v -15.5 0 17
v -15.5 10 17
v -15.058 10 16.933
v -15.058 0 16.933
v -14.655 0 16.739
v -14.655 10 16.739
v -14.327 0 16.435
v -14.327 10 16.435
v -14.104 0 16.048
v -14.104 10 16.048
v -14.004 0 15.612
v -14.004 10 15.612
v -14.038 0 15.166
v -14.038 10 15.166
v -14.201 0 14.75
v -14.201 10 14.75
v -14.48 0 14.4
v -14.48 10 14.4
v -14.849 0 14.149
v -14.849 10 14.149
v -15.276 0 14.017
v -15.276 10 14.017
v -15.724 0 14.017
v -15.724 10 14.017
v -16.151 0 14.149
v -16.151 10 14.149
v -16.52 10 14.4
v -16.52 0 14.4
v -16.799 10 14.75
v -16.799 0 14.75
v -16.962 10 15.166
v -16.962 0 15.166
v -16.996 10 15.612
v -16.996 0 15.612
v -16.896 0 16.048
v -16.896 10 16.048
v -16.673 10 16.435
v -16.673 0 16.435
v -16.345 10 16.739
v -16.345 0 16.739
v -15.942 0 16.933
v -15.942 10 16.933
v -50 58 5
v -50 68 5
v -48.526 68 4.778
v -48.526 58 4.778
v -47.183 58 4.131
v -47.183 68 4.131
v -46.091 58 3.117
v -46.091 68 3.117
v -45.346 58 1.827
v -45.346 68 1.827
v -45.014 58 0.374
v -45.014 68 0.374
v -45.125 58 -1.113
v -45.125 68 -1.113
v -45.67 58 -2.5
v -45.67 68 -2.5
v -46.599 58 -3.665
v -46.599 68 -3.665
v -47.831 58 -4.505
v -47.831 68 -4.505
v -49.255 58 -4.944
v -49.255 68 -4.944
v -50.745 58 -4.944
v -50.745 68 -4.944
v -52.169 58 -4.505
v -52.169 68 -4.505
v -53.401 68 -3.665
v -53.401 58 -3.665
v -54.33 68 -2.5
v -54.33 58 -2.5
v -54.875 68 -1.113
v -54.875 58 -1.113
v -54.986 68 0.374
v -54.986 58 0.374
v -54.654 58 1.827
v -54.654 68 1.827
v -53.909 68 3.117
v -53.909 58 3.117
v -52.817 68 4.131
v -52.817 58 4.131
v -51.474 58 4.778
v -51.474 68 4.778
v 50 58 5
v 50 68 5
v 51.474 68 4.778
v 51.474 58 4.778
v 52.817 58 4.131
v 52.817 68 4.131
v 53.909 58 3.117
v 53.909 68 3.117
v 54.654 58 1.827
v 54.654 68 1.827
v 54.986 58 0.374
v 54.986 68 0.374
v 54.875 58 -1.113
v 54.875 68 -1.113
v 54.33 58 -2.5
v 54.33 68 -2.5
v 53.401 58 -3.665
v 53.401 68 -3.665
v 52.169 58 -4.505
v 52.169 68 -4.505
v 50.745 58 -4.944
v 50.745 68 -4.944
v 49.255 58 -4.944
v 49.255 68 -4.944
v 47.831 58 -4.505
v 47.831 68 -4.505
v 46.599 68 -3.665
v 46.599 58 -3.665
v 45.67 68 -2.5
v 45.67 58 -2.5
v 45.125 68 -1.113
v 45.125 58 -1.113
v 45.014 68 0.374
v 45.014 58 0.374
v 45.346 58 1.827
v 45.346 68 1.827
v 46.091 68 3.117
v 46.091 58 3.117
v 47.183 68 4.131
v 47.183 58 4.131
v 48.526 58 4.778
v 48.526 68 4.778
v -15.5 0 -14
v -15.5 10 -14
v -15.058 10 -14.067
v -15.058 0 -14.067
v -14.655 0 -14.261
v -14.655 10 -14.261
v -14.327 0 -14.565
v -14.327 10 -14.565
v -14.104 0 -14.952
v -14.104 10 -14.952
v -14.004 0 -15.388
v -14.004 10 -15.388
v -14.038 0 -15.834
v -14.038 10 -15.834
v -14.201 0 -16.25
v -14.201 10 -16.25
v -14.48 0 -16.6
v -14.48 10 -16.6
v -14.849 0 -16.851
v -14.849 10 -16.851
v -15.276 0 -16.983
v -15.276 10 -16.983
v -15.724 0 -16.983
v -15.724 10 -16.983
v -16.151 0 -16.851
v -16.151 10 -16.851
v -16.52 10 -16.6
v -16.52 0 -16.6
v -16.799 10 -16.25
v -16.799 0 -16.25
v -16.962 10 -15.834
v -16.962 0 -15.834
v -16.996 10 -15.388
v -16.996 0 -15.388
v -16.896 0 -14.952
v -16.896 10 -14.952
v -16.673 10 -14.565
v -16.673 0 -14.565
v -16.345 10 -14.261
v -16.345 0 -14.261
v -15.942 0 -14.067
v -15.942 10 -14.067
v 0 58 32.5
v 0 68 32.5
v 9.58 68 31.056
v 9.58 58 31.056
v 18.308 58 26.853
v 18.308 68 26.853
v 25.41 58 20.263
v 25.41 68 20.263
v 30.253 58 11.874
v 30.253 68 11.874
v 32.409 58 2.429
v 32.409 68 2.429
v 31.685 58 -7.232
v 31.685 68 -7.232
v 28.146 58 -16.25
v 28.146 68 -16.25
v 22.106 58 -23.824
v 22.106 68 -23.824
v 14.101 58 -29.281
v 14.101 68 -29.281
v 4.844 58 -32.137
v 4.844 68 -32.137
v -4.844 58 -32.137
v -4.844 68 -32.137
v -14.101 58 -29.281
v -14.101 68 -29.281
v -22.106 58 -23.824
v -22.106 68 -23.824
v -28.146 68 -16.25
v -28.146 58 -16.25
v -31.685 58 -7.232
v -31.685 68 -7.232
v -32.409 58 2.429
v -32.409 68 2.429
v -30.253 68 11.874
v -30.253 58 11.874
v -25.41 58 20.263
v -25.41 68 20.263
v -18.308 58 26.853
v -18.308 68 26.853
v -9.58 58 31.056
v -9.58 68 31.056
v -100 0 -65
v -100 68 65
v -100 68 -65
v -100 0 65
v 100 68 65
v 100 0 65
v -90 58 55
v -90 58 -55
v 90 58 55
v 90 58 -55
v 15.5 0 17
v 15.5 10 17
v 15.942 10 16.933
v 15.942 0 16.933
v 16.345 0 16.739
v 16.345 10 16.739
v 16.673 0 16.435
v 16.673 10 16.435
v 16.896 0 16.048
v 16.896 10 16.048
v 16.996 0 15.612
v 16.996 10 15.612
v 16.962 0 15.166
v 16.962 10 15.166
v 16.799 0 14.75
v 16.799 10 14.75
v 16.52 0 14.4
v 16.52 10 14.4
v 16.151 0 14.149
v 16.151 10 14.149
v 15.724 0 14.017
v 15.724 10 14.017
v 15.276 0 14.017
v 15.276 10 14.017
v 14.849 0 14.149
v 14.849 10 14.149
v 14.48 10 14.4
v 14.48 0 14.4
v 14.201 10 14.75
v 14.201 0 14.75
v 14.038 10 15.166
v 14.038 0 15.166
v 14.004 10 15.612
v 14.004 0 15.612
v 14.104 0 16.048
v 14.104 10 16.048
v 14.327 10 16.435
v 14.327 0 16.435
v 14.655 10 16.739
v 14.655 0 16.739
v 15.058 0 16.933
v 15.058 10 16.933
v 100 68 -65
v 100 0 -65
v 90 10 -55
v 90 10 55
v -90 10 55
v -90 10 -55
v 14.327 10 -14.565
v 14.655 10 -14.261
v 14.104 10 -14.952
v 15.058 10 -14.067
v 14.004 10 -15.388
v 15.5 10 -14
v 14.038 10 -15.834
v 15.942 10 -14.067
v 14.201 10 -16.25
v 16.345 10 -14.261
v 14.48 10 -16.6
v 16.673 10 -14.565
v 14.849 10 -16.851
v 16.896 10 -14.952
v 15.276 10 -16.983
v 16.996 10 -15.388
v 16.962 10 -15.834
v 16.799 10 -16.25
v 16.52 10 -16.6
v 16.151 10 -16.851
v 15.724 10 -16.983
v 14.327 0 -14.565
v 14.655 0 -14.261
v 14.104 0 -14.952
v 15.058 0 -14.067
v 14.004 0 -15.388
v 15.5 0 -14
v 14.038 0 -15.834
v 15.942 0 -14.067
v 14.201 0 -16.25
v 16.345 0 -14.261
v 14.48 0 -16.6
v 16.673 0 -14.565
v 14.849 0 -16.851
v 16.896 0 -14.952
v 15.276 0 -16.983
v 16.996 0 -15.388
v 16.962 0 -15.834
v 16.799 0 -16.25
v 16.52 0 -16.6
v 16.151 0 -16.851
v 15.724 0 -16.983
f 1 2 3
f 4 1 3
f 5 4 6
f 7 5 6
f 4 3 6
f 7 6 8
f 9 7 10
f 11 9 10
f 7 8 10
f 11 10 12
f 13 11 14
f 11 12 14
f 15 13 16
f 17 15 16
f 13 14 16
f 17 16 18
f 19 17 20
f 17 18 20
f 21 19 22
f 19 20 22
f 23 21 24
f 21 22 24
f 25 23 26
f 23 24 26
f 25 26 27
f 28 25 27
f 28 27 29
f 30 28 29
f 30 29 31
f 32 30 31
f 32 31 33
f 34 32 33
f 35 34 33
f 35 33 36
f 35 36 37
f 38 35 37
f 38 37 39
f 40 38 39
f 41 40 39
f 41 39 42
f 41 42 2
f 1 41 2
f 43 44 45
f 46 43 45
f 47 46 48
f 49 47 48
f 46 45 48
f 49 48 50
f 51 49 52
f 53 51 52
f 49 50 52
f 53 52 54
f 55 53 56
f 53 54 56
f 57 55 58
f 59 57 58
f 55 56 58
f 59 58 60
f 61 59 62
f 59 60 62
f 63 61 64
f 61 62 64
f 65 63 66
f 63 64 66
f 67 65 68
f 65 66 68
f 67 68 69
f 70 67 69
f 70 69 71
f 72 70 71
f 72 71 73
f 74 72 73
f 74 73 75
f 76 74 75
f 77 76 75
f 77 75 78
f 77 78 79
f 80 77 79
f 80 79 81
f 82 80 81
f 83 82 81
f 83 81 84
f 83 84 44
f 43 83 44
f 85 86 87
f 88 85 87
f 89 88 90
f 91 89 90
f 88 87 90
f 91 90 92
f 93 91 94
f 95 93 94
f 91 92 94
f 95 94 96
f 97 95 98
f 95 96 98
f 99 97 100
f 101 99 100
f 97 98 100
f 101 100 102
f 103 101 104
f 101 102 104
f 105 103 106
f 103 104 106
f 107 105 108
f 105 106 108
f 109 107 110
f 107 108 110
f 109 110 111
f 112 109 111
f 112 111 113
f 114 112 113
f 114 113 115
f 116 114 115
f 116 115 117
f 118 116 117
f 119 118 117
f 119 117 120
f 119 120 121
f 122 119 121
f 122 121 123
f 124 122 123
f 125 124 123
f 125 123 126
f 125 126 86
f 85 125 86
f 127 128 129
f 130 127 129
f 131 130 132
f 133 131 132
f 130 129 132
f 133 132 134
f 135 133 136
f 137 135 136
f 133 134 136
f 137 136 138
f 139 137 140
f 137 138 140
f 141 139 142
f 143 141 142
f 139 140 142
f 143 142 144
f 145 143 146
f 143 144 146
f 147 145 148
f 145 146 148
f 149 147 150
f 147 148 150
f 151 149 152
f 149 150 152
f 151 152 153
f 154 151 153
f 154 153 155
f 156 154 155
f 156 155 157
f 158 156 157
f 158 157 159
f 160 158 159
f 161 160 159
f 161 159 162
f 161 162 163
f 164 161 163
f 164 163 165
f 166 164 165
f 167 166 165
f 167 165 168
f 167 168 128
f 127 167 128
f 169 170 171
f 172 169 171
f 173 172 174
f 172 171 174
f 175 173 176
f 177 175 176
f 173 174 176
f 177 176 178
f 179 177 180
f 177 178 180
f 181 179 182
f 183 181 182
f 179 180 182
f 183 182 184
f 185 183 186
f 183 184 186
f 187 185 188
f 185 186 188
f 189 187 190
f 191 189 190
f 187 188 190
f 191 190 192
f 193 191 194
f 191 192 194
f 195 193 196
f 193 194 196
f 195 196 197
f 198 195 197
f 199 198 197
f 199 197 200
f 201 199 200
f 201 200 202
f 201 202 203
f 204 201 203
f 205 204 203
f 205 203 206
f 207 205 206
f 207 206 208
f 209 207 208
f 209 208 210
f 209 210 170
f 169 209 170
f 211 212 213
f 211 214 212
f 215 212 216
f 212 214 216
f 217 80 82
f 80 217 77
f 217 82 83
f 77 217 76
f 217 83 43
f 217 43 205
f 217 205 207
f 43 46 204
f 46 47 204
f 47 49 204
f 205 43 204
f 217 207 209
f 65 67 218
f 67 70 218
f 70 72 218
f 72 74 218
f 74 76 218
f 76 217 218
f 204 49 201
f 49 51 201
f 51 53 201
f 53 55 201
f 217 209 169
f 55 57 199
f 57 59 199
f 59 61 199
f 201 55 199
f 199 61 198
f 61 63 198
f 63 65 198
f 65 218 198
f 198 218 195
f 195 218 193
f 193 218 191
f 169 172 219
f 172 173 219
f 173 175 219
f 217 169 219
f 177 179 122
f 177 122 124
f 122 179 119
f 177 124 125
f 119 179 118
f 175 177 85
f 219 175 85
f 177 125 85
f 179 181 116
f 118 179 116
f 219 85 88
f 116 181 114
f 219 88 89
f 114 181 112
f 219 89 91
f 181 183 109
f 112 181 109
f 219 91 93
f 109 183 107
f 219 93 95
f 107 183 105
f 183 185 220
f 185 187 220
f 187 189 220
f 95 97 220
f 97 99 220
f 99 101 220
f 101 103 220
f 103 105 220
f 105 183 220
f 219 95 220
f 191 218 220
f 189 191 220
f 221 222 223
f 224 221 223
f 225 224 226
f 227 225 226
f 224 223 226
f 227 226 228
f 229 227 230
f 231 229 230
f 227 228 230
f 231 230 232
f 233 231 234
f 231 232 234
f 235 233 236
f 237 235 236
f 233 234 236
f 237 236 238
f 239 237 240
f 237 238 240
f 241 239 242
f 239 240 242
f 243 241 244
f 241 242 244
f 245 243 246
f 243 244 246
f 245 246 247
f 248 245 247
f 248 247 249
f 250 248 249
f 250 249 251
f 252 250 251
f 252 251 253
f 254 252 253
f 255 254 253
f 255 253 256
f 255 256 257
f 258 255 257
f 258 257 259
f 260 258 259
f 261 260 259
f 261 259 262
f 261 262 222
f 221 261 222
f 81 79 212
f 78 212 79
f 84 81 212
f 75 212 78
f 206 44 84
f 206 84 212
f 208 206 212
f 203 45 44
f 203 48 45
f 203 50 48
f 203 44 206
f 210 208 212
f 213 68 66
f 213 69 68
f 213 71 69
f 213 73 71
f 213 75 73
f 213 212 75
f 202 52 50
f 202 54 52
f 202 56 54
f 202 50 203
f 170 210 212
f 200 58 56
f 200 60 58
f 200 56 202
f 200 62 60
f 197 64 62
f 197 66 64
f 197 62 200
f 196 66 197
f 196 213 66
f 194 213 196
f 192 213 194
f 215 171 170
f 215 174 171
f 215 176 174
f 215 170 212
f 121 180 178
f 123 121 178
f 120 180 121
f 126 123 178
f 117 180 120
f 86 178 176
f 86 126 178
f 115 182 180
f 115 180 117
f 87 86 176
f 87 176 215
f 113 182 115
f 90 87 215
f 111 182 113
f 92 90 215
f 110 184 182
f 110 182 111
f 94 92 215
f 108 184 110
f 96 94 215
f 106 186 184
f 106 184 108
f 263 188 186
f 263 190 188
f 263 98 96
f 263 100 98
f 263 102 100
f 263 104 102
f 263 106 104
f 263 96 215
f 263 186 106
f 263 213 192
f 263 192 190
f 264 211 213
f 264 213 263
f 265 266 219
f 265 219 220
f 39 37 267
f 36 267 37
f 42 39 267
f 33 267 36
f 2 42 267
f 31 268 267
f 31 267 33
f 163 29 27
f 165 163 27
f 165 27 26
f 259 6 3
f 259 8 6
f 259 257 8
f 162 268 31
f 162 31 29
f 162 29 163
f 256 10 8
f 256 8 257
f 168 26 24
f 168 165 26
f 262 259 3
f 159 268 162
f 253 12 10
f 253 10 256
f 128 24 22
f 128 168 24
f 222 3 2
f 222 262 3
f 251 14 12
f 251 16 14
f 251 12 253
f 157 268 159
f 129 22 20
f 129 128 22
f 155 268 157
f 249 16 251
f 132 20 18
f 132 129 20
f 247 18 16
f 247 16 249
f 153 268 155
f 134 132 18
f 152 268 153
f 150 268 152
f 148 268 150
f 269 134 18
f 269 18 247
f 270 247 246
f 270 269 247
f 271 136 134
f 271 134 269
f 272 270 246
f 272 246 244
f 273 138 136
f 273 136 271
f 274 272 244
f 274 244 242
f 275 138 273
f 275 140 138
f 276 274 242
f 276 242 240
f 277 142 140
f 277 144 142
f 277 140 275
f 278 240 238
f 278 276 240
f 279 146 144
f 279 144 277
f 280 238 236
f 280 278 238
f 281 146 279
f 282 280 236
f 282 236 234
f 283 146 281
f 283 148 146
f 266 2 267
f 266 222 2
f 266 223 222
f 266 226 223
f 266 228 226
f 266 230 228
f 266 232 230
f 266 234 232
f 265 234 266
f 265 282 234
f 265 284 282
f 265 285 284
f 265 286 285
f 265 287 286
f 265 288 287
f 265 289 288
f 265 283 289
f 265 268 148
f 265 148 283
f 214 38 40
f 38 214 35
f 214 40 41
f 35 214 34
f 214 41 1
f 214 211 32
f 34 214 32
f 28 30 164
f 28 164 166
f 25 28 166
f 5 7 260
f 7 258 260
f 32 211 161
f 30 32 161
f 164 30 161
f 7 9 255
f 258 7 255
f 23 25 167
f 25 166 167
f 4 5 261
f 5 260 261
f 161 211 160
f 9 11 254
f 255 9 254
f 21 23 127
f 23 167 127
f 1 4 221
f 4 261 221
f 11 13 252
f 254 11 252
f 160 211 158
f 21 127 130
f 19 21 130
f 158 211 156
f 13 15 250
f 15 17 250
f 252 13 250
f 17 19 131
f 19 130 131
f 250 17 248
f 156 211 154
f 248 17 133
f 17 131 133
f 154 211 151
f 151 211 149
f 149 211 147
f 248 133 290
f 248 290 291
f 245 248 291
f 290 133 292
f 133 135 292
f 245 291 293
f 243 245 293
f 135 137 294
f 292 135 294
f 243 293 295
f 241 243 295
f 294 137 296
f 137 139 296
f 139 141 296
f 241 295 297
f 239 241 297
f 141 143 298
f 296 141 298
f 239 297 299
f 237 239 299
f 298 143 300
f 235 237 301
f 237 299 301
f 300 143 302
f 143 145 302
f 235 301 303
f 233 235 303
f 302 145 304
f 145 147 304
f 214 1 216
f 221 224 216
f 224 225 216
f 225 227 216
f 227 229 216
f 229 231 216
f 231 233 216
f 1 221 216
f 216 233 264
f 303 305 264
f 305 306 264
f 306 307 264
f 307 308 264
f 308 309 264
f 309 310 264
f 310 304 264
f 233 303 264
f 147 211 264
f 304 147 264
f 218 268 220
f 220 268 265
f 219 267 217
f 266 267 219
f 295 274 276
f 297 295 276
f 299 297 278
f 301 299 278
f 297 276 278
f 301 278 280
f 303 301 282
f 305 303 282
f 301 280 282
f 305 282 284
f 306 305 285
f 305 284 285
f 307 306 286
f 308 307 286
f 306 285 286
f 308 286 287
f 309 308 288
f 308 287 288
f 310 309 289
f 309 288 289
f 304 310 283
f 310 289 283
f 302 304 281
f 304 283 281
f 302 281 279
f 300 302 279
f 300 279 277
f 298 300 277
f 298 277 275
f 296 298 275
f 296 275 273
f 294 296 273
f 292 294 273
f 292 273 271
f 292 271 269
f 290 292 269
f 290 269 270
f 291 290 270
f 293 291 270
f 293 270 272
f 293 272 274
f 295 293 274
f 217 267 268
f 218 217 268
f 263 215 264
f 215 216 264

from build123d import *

# Parameters (mm, degrees)
SKETCH1_W           = 200
SKETCH1_H           = 130
BOSS_EXTRUDE1_DEPTH = 58
SHELL1_T            = -10
SKETCH2_R           = 1.5
CUT_EXTRUDE1_DEPTH  = 129.565158577
SKETCH3_W           = 200
SKETCH3_H           = 130
BOSS_EXTRUDE2_DEPTH = 10
CUT_EXTRUDE2_REACH  = 139.292
SKETCH4_R           = 32.5
SKETCH4_R_2         = 5


with BuildPart() as part:
    # Sketch1 → Boss-Extrude1 (new body)
    with BuildSketch(Plane(origin=(0, 0, 0), x_dir=(1, 0, 0), z_dir=(0, 1, 0))):
        Rectangle(SKETCH1_W, SKETCH1_H)
    extrude(amount=BOSS_EXTRUDE1_DEPTH)

    # Shell1
    shell1_openings = [part.faces().sort_by_distance(p)[0] for p in [
        (0, 58, 0),
    ]]
    offset(amount=SHELL1_T, openings=shell1_openings, kind=Kind.INTERSECTION)

    # Sketch2 → Cut-Extrude1 (cut, through all)
    with BuildSketch(Plane(origin=(0, 10, 0), x_dir=(1, 0, 0), z_dir=(0, 1, 0))):
        with Locations(Location((-15.5, 15.5, 0), (0, 0, 270))):
            Circle(SKETCH2_R)
        with Locations(Location((15.5, 15.5, 0), (0, 0, 270))):
            Circle(SKETCH2_R)
        with Locations(Location((-15.5, -15.5, 0), (0, 0, 270))):
            Circle(SKETCH2_R)
        with Locations(Location((15.5, -15.5, 0), (0, 0, 270))):
            Circle(SKETCH2_R)
    extrude(amount=-CUT_EXTRUDE1_DEPTH, mode=Mode.SUBTRACT)

    # Sketch3 → Boss-Extrude2 (add)
    with BuildSketch(Plane(origin=(0, 58, 0), x_dir=(1, 0, 0), z_dir=(0, 1, 0))):
        Rectangle(SKETCH3_W, SKETCH3_H)
    extrude(amount=BOSS_EXTRUDE2_DEPTH)

    # Sketch4 → Cut-Extrude2 (cut, up to next)
    with BuildSketch(Plane(origin=(0, 68, 0), x_dir=(1, 0, 0), z_dir=(0, 1, 0)), mode=Mode.PRIVATE) as cut_extrude2_sk1:
        with Locations(Location((0, 0, 0), (0, 0, 270))):
            Circle(SKETCH4_R)
    cut_extrude2_tool1 = extrude(cut_extrude2_sk1.sketch, amount=-CUT_EXTRUDE2_REACH, mode=Mode.PRIVATE) & part.part
    # Sketch4 → Cut-Extrude2 (cut, up to next)
    with BuildSketch(Plane(origin=(0, 68, 0), x_dir=(1, 0, 0), z_dir=(0, 1, 0)), mode=Mode.PRIVATE) as cut_extrude2_sk2:
        with Locations(Location((-50, 0, 0), (0, 0, 270))):
            Circle(SKETCH4_R_2)
    cut_extrude2_tool2 = extrude(cut_extrude2_sk2.sketch, amount=-CUT_EXTRUDE2_REACH, mode=Mode.PRIVATE) & part.part
    # Sketch4 → Cut-Extrude2 (cut, up to next)
    with BuildSketch(Plane(origin=(0, 68, 0), x_dir=(1, 0, 0), z_dir=(0, 1, 0)), mode=Mode.PRIVATE) as cut_extrude2_sk3:
        with Locations(Location((50, 0, 0), (0, 0, 270))):
            Circle(SKETCH4_R_2)
    cut_extrude2_tool3 = extrude(cut_extrude2_sk3.sketch, amount=-CUT_EXTRUDE2_REACH, mode=Mode.PRIVATE) & part.part
    add(cut_extrude2_tool1.solids().sort_by_distance((0, 68, 0))[0], mode=Mode.SUBTRACT)
    add(cut_extrude2_tool2.solids().sort_by_distance((-50, 68, 0))[0], mode=Mode.SUBTRACT)
    add(cut_extrude2_tool3.solids().sort_by_distance((50, 68, 0))[0], mode=Mode.SUBTRACT)


solid = part.part
